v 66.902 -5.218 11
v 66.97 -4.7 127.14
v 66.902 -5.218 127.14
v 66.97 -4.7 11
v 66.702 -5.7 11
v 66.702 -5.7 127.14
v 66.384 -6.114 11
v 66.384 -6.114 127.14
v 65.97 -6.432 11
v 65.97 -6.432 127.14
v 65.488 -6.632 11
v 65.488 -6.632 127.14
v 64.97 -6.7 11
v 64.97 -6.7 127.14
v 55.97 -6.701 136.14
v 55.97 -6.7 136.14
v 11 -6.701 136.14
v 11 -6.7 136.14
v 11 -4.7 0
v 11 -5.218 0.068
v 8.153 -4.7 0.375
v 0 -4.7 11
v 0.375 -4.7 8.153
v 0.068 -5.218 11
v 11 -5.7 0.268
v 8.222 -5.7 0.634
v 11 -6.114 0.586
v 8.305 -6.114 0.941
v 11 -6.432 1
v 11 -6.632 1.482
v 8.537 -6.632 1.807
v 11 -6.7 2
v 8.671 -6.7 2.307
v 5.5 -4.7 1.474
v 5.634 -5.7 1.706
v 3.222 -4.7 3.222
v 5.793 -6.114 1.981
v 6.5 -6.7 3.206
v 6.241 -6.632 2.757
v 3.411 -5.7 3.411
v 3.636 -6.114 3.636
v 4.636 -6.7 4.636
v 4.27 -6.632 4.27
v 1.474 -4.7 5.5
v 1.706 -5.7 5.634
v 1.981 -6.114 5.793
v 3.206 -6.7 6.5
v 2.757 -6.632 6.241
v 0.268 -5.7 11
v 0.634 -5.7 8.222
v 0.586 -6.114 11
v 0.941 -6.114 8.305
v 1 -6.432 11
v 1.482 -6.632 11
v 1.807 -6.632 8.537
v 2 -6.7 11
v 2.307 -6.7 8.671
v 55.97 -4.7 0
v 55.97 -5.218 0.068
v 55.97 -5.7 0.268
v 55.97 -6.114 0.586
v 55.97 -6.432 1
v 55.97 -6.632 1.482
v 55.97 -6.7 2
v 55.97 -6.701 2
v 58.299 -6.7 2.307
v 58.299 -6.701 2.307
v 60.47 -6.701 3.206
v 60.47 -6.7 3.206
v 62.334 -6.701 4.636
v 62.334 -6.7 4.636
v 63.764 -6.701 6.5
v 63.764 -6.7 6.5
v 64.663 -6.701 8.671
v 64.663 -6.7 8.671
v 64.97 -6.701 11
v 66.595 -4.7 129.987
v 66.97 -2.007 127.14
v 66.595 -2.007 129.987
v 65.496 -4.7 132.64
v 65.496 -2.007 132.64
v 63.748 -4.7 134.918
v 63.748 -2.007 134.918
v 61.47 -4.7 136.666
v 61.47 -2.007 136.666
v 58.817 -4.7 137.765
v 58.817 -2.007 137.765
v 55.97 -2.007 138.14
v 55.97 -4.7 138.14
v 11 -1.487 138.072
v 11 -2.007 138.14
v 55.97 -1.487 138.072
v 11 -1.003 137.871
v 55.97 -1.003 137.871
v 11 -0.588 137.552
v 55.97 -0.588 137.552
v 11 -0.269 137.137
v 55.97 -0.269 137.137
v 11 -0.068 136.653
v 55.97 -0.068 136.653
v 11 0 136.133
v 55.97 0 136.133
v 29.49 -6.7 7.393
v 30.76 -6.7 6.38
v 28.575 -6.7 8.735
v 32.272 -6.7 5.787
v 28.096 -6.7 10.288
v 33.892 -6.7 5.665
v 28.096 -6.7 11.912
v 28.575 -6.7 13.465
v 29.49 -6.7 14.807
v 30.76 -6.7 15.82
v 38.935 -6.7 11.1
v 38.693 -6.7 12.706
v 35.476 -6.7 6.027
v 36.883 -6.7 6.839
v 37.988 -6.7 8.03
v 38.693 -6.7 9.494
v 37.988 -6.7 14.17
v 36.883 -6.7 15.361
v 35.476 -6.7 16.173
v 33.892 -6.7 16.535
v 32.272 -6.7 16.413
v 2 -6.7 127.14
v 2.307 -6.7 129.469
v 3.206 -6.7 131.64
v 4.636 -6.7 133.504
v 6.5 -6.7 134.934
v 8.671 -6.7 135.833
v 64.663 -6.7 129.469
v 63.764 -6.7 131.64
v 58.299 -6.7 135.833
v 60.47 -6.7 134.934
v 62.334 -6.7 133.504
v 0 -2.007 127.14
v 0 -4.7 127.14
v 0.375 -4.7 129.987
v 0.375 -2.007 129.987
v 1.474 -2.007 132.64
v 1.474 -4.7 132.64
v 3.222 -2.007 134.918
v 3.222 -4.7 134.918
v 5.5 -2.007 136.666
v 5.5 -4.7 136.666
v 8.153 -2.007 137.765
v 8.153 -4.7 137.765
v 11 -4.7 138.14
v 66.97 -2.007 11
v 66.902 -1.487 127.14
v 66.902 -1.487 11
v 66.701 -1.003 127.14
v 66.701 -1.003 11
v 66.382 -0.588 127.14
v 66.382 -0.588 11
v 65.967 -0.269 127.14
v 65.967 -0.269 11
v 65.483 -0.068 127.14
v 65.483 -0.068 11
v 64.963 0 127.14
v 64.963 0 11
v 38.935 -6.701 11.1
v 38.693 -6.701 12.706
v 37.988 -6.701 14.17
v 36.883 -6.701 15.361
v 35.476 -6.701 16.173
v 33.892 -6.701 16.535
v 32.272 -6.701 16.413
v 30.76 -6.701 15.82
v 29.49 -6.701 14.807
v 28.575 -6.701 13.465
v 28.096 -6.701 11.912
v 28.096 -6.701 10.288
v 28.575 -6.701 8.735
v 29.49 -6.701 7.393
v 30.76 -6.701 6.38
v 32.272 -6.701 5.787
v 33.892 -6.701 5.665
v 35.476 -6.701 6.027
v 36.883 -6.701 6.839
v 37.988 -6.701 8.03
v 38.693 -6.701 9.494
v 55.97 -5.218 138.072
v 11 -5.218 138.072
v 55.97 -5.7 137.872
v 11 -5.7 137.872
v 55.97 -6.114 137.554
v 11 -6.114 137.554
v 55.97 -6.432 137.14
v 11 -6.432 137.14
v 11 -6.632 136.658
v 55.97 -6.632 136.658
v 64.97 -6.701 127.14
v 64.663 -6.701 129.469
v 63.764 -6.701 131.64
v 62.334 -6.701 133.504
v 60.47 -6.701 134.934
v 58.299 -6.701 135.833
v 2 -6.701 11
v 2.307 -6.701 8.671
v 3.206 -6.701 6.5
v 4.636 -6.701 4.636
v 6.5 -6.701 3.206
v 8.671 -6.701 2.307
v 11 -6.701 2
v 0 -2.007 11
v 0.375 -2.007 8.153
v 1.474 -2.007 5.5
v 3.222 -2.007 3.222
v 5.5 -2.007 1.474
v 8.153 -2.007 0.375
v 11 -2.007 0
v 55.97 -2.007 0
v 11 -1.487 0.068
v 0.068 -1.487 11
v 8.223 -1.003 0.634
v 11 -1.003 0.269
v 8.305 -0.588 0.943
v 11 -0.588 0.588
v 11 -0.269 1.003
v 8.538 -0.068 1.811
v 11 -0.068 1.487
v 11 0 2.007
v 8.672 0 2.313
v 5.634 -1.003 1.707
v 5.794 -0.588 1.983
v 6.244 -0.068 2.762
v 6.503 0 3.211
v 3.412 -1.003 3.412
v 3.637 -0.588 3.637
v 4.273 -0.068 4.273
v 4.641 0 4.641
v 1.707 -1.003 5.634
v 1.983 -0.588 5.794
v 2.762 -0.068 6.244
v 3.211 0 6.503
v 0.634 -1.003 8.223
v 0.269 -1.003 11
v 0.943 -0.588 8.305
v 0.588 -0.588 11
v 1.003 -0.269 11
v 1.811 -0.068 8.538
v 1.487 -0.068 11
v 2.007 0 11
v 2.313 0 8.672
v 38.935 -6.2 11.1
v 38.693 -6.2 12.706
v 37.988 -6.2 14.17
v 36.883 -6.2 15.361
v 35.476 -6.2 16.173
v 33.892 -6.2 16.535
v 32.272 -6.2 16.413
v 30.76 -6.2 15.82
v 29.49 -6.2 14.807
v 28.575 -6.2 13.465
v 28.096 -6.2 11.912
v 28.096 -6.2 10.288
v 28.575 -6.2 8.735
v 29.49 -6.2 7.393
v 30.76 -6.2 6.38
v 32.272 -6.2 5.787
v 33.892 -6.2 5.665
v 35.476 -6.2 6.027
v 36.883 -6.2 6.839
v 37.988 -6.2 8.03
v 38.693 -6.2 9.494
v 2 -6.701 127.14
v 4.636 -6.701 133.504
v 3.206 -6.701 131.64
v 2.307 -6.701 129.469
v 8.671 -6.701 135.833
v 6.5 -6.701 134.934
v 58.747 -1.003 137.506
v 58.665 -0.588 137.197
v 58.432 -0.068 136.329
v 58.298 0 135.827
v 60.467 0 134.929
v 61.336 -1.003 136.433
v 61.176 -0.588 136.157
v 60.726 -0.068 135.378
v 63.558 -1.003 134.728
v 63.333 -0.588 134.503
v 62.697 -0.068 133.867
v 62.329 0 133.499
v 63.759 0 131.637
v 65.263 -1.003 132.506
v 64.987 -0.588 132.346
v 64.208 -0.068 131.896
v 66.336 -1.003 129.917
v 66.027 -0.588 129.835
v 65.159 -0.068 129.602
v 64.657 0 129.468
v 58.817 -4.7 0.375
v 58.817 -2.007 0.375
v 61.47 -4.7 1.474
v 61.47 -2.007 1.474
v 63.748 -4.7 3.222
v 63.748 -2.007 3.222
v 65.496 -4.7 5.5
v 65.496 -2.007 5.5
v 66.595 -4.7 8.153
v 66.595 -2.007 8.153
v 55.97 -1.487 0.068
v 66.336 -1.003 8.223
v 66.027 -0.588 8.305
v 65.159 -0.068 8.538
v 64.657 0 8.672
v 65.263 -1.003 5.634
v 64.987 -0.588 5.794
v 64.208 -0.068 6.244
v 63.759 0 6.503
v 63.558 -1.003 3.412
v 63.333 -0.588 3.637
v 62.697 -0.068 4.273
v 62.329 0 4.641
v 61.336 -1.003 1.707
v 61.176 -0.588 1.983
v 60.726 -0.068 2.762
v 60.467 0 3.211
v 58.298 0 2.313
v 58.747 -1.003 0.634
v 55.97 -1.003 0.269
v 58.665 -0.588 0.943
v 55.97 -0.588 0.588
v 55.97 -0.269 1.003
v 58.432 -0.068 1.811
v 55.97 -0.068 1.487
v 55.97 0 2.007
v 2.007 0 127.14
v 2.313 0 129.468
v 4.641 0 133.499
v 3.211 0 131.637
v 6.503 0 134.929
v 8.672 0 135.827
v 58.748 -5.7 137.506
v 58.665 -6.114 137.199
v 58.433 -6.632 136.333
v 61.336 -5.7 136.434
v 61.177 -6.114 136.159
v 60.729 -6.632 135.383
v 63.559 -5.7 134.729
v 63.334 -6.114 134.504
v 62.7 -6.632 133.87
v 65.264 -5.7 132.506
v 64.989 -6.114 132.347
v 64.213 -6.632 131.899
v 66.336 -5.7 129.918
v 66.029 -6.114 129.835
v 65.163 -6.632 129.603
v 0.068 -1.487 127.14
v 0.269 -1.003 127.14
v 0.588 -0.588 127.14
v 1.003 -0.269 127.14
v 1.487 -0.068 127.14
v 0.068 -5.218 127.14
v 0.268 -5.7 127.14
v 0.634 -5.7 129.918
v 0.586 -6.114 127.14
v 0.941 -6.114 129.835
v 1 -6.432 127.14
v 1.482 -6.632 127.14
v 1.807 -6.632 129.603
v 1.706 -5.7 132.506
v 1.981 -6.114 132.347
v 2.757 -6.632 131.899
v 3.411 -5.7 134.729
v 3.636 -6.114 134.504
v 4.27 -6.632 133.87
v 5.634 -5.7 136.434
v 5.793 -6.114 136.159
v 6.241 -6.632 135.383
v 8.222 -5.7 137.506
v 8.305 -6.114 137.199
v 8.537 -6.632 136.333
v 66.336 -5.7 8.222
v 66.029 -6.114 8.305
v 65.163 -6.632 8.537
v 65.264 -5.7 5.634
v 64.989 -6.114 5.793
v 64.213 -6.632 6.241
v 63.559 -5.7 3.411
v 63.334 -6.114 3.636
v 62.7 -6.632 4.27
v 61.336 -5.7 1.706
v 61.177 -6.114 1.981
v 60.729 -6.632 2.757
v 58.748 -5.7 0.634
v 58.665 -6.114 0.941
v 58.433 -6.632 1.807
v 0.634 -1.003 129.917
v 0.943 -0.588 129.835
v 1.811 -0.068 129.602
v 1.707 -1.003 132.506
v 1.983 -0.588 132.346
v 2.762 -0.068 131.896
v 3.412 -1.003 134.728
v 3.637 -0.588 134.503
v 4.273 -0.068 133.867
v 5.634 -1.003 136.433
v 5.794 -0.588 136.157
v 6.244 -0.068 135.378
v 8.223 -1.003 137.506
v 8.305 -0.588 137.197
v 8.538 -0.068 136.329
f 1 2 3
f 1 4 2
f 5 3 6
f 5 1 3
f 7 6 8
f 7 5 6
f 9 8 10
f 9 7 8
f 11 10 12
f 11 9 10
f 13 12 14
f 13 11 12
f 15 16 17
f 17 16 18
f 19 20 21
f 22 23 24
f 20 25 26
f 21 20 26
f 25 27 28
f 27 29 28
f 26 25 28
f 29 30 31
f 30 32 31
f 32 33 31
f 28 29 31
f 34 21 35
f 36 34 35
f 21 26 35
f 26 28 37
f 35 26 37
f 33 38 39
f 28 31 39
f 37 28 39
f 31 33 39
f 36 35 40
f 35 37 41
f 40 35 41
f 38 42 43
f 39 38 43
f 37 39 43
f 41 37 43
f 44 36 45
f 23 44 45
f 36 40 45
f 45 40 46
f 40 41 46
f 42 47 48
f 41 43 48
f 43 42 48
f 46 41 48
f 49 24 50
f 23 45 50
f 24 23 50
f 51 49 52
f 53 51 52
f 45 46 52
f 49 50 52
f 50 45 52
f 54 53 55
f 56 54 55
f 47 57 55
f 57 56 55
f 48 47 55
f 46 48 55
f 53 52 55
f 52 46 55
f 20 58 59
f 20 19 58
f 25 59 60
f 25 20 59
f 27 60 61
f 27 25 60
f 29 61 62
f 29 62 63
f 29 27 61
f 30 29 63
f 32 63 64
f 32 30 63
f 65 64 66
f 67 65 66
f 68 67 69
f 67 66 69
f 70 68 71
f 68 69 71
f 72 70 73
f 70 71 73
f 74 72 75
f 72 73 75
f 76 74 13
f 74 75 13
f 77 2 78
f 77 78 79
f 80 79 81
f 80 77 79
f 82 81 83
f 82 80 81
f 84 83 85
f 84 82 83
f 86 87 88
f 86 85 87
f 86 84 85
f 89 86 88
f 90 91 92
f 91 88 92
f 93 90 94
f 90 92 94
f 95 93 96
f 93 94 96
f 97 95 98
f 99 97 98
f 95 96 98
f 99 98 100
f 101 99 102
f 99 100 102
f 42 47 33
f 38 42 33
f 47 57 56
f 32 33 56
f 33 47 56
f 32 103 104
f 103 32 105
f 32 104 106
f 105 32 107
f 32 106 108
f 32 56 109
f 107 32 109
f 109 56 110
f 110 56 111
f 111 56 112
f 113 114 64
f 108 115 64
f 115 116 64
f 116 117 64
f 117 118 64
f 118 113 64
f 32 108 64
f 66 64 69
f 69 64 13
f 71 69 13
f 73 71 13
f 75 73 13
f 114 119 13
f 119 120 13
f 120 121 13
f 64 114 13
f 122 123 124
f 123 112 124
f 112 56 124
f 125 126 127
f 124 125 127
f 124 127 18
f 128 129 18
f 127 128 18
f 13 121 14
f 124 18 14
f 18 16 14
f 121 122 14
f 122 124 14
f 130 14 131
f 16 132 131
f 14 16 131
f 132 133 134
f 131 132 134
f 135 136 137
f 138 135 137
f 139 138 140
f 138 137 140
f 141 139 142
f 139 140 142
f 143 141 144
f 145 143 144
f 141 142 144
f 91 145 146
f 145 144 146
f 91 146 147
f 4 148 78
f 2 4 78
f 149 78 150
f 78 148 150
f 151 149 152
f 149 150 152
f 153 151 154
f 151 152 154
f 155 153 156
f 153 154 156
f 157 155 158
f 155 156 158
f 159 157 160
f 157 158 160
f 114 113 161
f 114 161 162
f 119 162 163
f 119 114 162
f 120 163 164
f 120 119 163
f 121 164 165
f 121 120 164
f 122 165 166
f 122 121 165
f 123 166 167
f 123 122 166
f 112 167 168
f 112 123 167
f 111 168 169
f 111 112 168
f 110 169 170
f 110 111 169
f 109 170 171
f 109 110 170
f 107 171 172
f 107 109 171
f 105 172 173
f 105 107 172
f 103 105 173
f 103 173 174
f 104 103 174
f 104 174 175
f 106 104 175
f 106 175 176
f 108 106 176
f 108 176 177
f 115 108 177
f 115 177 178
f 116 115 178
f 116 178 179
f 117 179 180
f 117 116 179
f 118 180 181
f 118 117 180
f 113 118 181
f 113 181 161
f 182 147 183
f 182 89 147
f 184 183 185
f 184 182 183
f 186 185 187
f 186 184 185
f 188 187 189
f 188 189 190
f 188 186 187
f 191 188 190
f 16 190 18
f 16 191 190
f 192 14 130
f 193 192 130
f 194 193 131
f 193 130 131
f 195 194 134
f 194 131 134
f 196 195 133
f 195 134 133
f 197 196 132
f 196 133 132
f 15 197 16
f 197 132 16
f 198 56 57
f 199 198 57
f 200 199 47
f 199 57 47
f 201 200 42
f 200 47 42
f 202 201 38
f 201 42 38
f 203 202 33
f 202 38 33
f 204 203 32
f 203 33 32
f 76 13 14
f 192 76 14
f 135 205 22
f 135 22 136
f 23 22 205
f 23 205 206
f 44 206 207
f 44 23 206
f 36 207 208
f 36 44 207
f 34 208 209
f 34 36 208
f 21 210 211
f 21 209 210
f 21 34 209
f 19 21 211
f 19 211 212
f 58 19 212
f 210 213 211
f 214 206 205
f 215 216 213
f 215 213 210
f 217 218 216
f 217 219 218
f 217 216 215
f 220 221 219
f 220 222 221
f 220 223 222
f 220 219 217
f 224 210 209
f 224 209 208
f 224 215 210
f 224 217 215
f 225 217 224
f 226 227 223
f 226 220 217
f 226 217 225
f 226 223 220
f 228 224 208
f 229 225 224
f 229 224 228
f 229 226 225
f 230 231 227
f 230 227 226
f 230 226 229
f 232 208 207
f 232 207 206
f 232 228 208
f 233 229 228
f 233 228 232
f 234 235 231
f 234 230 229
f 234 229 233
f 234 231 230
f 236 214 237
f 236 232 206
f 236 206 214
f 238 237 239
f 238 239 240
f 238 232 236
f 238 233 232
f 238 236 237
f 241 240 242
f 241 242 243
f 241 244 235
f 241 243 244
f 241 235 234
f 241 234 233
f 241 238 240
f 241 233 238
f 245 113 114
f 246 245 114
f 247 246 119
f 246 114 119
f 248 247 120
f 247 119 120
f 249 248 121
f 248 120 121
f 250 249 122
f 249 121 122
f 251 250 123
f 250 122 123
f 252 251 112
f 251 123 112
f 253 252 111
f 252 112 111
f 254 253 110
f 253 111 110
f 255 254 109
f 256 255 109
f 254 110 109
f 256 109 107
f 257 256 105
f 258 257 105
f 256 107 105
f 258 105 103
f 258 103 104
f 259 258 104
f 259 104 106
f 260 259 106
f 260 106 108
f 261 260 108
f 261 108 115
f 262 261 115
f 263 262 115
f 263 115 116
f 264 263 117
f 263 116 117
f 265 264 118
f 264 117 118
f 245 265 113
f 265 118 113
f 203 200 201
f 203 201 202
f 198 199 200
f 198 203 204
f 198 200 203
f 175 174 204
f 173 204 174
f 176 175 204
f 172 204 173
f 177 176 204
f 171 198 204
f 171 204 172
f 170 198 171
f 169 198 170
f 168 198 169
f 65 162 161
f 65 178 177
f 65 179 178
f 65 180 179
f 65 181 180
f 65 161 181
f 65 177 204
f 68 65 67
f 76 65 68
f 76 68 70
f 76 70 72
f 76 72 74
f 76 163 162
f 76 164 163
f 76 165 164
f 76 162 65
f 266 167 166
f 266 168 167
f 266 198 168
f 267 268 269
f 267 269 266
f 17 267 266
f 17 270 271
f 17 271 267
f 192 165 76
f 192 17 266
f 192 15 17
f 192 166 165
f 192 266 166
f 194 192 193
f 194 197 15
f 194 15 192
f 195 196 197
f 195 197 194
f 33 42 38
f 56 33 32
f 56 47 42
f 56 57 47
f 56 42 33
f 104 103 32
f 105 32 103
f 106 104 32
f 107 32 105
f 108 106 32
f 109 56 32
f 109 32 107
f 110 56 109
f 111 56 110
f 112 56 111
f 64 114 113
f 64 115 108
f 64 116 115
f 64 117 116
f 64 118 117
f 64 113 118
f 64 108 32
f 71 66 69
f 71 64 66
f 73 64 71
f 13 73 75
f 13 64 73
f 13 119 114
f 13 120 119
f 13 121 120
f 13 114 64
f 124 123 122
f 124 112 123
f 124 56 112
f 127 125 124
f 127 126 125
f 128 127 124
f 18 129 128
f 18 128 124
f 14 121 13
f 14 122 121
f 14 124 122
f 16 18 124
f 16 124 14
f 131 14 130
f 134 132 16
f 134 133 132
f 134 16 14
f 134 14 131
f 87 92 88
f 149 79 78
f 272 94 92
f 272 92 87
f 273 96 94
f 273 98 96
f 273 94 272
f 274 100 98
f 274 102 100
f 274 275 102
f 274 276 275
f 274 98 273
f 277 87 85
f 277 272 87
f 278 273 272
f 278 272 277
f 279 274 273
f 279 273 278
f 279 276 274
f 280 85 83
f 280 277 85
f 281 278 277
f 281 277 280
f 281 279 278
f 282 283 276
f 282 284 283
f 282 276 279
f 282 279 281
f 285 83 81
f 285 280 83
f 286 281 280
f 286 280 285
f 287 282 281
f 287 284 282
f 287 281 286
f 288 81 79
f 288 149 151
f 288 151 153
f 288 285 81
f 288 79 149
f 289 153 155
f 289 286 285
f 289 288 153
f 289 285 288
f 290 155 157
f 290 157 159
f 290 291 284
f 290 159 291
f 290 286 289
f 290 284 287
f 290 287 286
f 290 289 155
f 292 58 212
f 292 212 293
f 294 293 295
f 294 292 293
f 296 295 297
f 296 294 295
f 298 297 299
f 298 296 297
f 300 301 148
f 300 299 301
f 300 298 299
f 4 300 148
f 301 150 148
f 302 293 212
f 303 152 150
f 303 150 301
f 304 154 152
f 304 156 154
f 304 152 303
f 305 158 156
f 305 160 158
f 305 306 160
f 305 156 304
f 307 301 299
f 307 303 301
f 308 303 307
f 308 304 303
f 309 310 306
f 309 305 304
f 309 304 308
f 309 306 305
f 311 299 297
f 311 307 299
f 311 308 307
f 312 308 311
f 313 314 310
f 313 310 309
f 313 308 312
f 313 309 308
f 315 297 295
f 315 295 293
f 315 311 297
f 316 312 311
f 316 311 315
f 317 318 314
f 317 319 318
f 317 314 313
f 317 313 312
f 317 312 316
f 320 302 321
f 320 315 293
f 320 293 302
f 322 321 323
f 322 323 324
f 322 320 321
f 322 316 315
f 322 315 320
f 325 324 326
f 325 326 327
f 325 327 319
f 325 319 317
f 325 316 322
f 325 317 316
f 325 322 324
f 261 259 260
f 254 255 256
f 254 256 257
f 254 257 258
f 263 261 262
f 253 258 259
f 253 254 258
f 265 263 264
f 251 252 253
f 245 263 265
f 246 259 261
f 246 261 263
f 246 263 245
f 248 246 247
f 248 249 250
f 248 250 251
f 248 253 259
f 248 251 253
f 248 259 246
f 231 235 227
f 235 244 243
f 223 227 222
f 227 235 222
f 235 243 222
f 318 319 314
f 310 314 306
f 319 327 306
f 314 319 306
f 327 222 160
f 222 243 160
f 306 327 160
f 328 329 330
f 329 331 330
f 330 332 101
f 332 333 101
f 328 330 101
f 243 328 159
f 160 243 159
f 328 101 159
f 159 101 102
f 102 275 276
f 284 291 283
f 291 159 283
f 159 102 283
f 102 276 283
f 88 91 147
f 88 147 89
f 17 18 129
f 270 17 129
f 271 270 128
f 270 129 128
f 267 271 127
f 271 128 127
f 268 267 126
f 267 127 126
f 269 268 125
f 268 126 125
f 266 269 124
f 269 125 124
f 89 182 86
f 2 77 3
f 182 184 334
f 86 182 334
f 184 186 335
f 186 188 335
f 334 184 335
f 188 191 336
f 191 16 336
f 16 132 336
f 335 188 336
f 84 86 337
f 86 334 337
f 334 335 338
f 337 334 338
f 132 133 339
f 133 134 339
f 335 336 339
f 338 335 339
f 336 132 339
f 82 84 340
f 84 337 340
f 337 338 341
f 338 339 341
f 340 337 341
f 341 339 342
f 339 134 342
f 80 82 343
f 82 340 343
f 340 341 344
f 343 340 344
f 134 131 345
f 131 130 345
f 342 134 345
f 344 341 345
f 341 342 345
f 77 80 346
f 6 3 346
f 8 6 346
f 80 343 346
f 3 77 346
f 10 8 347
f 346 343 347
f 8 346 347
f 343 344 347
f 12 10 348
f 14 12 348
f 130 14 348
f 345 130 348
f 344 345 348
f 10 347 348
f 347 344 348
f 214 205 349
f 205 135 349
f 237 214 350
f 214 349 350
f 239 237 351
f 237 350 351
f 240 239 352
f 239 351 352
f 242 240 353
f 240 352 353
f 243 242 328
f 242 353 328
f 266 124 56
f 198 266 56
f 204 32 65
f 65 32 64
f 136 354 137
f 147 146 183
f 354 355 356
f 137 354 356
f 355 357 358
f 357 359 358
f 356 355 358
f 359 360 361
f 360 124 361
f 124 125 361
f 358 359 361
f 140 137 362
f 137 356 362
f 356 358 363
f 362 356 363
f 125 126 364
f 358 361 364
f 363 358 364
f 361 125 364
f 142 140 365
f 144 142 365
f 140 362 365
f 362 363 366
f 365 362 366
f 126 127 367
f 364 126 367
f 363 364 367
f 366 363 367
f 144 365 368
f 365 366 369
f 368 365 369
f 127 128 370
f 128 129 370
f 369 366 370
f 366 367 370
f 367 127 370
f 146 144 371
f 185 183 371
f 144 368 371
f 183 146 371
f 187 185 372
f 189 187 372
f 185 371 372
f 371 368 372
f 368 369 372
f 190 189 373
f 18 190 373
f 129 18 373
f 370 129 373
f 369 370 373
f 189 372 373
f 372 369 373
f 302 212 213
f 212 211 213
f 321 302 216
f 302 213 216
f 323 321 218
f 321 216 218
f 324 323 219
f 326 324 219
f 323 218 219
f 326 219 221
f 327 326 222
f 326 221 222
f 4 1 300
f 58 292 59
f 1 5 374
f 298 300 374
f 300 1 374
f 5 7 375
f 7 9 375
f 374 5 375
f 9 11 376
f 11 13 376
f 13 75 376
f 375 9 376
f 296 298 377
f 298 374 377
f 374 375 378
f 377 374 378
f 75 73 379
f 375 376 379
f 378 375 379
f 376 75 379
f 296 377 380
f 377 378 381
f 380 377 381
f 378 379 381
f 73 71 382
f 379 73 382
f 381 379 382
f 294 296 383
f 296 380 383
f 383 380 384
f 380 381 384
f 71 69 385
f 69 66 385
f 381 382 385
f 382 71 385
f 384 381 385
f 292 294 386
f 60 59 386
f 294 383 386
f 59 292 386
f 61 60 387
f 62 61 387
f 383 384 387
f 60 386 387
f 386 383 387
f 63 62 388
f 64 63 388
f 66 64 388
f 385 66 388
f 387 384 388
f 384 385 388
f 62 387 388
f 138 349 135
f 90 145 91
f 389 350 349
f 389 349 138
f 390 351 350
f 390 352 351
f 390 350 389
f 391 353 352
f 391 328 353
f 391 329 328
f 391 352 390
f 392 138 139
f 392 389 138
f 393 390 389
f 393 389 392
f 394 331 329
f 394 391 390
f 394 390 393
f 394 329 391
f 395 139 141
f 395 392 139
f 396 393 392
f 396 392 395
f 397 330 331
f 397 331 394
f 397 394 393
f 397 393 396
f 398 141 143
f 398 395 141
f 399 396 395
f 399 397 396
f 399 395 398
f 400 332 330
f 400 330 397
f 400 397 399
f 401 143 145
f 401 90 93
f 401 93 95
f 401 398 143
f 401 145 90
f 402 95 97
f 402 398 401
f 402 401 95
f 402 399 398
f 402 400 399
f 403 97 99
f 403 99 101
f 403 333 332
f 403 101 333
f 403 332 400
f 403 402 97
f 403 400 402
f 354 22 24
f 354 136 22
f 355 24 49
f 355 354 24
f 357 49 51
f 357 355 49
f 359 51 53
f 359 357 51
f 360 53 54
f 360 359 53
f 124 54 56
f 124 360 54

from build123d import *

# Parameters (mm, degrees)
F0_W      = 66.97
F0_H      = 138.14
F1_DEPTH  = 6.7
F2_R      = 11
F3_R      = 2
F4_R      = 2.0066
F5_R      = 5.45
F6_DEPTH  = 0.5
F8_DEPTH  = 0.001
F9_DEPTH  = 0.001
F11_DEPTH = 0.001


with BuildPart() as f1:
    # F0 (on Front) → F1 (new body)
    with BuildSketch(Plane.XZ):
        with Locations((33.485, 69.07)):
            Rectangle(F0_W, F0_H)
    extrude(amount=F1_DEPTH)

    # F2
    f2_edges = [f1.edges().sort_by_distance(p)[0] for p in [
        (0, -3.35, 138.14),
        (66.97, -3.35, 138.14),
        (66.97, -3.35, 0),
        (0, -3.35, 0),
    ]]
    fillet(f2_edges, radius=F2_R)

    # F3
    f3_edges = [f1.edges().sort_by_distance(p)[0] for p in [
        (0, -6.7, 69.07),
        (3.221825, -6.7, 134.918175),
        (3.221825, -6.7, 3.221825),
        (33.485, -6.7, 138.14),
        (33.485, -6.7, 0),
        (63.748175, -6.7, 134.918175),
        (63.748175, -6.7, 3.221825),
        (66.97, -6.7, 69.07),
    ]]
    fillet(f3_edges, radius=F3_R)

    # F4
    f4_edges = [f1.edges().sort_by_distance(p)[0] for p in [
        (0, 0, 69.07),
        (3.221825, 0, 134.918175),
        (3.221825, 0, 3.221825),
        (33.485, 0, 138.14),
        (33.485, 0, 0),
        (63.748175, 0, 134.918175),
        (63.748175, 0, 3.221825),
        (66.97, 0, 69.07),
    ]]
    fillet(f4_edges, radius=F4_R)


with BuildPart() as f6:
    # F5 (on face) → F6 (new body)
    with BuildSketch(Plane.XZ.offset(6.7)):
        with Locations((33.485, 11.1)):
            Circle(F5_R)
    extrude(amount=-F6_DEPTH)


with BuildPart() as f1_1:
    add(f1.part)

    # F7: cut F6
    add(f6.part, mode=Mode.SUBTRACT)


with BuildPart() as f8:
    # F5 (on face) → F8 (new body)
    with BuildSketch(Plane.XZ.offset(6.7)):
        with BuildLine():
            ThreePointArc((11, 136.14), (4.636039, 133.503961), (2, 127.14))
            Line((2, 127.14), (2, 11))
            ThreePointArc((2, 11), (4.636039, 4.636039), (11, 2))
            Line((11, 2), (55.97, 2))
            ThreePointArc((55.97, 2), (62.333961, 4.636039), (64.97, 11))
            Line((64.97, 11), (64.97, 127.14))
            ThreePointArc((64.97, 127.14), (62.333961, 133.503961), (55.97, 136.14))
            Line((55.97, 136.14), (11, 136.14))
        make_face()
        with Locations((33.485, 11.1)):
            Circle(F5_R, mode=Mode.SUBTRACT)
    extrude(amount=F8_DEPTH)


with BuildPart() as f9:
    # F5 (on face) → F9 (new body)
    with BuildSketch(Plane.XZ.offset(6.7)):
        with Locations((33.485, 11.1)):
            Circle(F5_R)
    extrude(amount=F9_DEPTH)


with BuildPart() as f11:
    # F5 (on face) → F11 (new body)
    with BuildSketch(Plane.XZ.offset(6.7)):
        with Locations((33.485, 11.1)):
            Circle(F5_R)
    extrude(amount=-F11_DEPTH)


solid = Compound([f1_1.part, f8.part])
